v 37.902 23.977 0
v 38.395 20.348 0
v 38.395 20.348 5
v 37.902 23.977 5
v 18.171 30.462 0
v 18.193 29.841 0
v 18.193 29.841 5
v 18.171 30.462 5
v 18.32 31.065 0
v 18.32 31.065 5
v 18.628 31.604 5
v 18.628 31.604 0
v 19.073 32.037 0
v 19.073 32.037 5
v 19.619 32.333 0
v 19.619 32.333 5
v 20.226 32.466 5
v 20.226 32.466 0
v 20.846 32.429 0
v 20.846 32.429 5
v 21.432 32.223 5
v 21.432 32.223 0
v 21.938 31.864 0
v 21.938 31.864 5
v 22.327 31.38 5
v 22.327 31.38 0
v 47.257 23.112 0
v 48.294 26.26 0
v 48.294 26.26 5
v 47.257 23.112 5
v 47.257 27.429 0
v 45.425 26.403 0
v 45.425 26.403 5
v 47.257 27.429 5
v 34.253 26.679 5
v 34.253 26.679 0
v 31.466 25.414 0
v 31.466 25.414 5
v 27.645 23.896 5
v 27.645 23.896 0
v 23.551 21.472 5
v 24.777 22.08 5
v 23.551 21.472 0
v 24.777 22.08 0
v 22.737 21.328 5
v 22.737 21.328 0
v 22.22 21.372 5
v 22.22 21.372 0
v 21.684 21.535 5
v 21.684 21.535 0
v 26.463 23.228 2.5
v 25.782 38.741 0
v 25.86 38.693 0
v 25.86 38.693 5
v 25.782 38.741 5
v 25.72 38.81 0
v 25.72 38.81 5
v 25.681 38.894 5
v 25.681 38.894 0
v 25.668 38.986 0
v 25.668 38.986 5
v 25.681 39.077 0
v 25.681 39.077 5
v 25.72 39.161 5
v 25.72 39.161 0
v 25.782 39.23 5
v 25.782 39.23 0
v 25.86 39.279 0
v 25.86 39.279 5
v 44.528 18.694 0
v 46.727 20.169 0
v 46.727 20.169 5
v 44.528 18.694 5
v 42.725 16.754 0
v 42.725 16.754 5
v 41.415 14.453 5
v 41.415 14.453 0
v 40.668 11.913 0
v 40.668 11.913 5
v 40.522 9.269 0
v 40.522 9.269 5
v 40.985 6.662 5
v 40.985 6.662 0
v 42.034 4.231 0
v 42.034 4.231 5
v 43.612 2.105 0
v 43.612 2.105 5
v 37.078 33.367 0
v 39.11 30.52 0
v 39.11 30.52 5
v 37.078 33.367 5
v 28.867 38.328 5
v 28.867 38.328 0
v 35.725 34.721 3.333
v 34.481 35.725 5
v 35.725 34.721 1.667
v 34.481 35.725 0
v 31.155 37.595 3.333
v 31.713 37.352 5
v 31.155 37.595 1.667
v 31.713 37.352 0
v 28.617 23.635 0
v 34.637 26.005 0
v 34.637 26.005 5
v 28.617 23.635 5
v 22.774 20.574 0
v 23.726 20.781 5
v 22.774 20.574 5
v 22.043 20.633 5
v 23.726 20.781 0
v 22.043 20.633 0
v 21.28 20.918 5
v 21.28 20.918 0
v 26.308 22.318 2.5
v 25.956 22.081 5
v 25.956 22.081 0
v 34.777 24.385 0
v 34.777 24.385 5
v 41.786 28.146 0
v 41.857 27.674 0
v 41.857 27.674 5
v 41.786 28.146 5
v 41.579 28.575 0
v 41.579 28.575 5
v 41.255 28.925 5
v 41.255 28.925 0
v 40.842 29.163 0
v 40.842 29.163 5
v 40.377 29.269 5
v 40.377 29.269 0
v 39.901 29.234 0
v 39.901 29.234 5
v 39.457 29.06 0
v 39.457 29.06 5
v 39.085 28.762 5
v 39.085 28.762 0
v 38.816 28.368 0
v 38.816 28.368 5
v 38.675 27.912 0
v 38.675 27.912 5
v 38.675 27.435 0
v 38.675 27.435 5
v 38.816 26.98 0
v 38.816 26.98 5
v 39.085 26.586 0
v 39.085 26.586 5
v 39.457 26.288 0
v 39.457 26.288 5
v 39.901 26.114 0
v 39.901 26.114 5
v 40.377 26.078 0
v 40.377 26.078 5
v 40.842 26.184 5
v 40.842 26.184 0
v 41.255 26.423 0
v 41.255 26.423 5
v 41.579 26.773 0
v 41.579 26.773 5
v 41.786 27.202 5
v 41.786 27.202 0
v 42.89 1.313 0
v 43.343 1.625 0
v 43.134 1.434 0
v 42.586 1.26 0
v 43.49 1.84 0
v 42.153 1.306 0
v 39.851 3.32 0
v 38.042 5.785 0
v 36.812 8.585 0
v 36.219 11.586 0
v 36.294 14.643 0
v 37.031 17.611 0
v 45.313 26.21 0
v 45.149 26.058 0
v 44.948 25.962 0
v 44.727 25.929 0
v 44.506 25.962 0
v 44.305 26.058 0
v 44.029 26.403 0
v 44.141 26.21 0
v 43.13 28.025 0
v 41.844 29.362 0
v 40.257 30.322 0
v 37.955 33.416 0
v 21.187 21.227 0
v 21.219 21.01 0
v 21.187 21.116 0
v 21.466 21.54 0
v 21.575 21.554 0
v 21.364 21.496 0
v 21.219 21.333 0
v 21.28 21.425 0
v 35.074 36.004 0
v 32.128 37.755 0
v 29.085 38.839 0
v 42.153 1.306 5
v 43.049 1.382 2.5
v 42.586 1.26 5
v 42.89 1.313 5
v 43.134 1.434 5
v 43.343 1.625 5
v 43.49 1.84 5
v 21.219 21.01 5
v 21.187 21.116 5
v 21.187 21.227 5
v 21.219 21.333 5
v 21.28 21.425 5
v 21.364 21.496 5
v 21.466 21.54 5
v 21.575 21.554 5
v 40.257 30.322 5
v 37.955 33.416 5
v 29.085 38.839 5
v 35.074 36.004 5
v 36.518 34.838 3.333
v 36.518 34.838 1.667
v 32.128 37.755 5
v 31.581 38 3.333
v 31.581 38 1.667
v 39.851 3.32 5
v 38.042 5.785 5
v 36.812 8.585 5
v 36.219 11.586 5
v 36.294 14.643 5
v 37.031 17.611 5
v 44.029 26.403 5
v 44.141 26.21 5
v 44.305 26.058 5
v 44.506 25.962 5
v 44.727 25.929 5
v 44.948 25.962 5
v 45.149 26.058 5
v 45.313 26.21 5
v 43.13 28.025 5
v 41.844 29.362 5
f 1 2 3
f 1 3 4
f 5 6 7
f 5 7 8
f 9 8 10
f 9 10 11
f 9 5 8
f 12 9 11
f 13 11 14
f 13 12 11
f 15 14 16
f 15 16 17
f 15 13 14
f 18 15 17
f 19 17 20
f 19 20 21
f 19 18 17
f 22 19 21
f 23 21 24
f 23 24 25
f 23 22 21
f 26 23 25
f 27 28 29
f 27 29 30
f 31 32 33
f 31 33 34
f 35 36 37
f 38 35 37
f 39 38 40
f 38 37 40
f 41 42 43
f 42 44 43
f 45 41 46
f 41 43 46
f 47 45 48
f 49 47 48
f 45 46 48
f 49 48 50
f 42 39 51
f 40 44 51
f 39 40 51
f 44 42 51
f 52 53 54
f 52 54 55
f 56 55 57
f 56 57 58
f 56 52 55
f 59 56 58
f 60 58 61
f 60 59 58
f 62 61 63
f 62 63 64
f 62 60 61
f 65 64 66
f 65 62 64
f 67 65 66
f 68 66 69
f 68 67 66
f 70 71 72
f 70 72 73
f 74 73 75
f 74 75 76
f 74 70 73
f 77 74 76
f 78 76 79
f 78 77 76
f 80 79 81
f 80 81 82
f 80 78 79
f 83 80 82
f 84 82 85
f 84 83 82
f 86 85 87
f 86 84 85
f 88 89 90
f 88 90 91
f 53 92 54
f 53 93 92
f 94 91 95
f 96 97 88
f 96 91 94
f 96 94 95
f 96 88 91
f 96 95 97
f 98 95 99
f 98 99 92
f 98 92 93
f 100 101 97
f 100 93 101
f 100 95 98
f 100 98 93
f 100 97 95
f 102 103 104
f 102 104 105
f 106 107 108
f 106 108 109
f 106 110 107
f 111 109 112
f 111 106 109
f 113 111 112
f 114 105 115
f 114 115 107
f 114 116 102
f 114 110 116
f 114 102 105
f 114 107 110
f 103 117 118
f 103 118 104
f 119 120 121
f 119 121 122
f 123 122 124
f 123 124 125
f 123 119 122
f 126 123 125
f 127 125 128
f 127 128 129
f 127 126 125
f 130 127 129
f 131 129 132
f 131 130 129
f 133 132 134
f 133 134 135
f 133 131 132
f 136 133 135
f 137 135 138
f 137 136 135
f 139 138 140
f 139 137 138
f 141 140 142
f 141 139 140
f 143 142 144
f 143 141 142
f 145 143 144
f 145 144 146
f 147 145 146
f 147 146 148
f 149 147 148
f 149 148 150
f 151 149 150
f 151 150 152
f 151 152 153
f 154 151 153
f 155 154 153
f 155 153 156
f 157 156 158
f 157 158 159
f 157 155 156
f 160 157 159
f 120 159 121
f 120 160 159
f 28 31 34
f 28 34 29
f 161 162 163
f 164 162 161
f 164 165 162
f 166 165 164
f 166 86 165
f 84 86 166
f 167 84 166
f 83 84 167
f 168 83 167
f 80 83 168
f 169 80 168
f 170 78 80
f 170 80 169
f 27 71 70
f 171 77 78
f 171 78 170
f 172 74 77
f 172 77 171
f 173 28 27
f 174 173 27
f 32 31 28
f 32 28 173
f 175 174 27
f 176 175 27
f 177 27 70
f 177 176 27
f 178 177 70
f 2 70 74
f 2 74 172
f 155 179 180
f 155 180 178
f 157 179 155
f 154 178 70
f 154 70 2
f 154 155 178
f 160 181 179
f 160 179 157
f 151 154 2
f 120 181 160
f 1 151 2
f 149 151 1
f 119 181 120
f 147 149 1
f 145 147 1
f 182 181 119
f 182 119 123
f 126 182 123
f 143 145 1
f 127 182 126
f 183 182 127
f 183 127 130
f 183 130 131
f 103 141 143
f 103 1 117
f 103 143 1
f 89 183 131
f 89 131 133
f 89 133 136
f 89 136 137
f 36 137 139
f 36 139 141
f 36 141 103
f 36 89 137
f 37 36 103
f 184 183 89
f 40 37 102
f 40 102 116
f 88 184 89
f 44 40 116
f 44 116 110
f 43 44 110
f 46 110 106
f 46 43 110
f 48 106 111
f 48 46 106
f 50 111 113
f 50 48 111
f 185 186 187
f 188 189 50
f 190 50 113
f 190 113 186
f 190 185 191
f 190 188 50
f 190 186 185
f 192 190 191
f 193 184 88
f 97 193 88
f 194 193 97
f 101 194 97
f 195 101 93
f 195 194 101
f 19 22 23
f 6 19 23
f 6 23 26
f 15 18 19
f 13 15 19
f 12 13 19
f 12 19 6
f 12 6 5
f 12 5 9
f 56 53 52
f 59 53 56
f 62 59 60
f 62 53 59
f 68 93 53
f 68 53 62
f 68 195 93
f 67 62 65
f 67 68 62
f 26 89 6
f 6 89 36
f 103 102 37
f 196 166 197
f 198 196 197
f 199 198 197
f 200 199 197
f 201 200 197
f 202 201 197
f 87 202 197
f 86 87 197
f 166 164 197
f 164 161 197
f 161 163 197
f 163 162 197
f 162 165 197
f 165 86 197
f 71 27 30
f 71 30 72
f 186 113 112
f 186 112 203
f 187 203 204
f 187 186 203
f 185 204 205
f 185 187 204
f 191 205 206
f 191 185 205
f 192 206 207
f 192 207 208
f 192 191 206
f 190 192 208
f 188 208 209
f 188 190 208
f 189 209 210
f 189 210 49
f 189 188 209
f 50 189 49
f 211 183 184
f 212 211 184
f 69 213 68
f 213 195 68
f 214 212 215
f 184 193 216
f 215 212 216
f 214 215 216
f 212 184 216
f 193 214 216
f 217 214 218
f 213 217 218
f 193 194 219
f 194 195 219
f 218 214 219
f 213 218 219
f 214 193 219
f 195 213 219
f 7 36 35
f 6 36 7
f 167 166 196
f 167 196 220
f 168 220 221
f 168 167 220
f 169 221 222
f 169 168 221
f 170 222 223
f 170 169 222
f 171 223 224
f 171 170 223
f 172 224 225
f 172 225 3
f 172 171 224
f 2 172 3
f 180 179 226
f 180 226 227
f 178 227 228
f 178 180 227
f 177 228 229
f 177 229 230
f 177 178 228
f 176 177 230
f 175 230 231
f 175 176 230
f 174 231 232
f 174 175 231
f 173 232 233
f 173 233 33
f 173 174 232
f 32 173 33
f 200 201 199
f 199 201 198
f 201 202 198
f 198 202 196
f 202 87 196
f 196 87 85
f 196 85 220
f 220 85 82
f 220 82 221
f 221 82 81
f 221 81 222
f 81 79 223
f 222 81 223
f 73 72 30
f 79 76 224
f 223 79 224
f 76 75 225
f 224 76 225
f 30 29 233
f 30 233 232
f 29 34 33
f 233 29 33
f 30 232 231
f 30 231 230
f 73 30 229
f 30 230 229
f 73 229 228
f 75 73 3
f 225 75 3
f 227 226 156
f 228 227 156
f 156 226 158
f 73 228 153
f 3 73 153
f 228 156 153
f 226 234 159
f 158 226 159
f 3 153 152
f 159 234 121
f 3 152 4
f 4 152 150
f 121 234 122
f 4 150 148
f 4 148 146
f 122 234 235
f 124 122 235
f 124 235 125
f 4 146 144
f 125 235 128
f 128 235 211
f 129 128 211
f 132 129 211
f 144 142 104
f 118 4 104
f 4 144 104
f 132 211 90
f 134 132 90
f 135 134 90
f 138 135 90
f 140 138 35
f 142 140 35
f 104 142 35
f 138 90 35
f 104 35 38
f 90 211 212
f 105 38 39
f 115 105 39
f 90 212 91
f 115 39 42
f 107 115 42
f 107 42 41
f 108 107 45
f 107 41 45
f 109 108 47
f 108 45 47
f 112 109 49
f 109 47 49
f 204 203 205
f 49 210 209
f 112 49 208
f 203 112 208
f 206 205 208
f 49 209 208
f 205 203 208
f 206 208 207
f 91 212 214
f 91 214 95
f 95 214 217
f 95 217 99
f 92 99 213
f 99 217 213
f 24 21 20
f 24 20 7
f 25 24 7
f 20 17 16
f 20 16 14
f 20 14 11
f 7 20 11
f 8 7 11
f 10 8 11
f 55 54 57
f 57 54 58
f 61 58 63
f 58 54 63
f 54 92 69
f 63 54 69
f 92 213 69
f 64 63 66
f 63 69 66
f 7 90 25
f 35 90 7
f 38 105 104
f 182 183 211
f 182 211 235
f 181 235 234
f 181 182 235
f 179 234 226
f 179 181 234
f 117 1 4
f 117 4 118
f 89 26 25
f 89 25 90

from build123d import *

# Parameters (mm, degrees)
ESQUISSE1_R        = 1.6
BOSS_EXTRU_1_DEPTH = 5


with BuildPart() as part:
    # Esquisse1 → Boss.-Extru.1 (new body)
    with BuildSketch(Plane.XY):
        with BuildLine():
            Line((22.327201908, 31.379603837), (39.110435041, 30.51970557))
            add(Edge.make_bspline(
                [(39.110435041, 30.51970557), (36.47036177, 35.234015671), (31.363758289, 38.634202101), (25.860213157, 38.692785858)],
                knots=[0, 0, 0, 0, 1, 1, 1, 1], degree=3))
            ThreePointArc((25.860213157, 38.692785858), (25.667702993, 38.985657248), (25.860213157, 39.278528639))
            add(Edge.make_bspline(
                [(40.257442964, 30.322056107), (37.254594876, 35.338660309), (31.834783082, 39.118012576), (25.860213157, 39.278528639)],
                knots=[0, 0, 0, 0, 1, 1, 1, 1], degree=3))
            ThreePointArc((40.257442964, 30.322056107), (42.530790825, 28.735523525), (44.029353415, 26.403248607))
            ThreePointArc((44.029353415, 26.403248607), (44.727102443, 25.92851016), (45.42485147, 26.403248607))
            Line((45.42485147, 26.403248607), (47.257362462, 27.428768466))
            Line((47.257362462, 27.428768466), (48.294348688, 26.259658274))
            Line((48.294348688, 26.259658274), (47.257362462, 23.11213505))
            Line((47.257362462, 23.11213505), (46.726853729, 20.169285321))
            ThreePointArc((46.726853729, 20.169285321), (40.667605427, 11.913133381), (43.612357696, 2.104618258))
            add(Edge.make_bspline(
                [(42.15327541, 1.306168032), (43.216115527, 1.058074746), (43.612357696, 2.104618258)],
                knots=[0, 0, 0, 1, 1, 1], degree=2))
            ThreePointArc((42.15327541, 1.306168032), (36.433188896, 10.069245024), (38.395197552, 20.348419608))
            Line((38.395197552, 20.348419608), (37.901995747, 23.976769729))
            Line((37.901995747, 23.976769729), (34.777422909, 24.385367715))
            Line((34.777422909, 24.385367715), (34.63683293, 26.004711162))
            add(Edge.make_bspline(
                [(34.63683293, 26.004711162), (31.667222126, 24.941467321), (27.310515623, 23.524901716), (23.172641891, 19.922056798), (21.279549959, 20.917906985)],
                knots=[0, 0, 0, 0, 0.624834994, 1, 1, 1, 1], degree=3))
            ThreePointArc((21.279549959, 20.917906985), (21.246108661, 21.381188034), (21.68443358, 21.534872503))
            add(Edge.make_bspline(
                [(34.253498198, 26.678639313), (31.663787476, 25.192133844), (27.282995796, 24.602462594), (23.471926653, 20.784486953), (21.68443358, 21.534872503)],
                knots=[0, 0, 0, 0, 0.618454585, 1, 1, 1, 1], degree=3))
            Line((34.253498198, 26.678639313), (18.193151692, 29.841352594))
            ThreePointArc((18.193151692, 29.841352594), (19.619419184, 32.332514308), (22.327201908, 31.379603837))
        make_face()
        with Locations((40.257442964, 27.673893027)):
            Circle(ESQUISSE1_R, mode=Mode.SUBTRACT)
    extrude(amount=BOSS_EXTRU_1_DEPTH)


solid = part.part
